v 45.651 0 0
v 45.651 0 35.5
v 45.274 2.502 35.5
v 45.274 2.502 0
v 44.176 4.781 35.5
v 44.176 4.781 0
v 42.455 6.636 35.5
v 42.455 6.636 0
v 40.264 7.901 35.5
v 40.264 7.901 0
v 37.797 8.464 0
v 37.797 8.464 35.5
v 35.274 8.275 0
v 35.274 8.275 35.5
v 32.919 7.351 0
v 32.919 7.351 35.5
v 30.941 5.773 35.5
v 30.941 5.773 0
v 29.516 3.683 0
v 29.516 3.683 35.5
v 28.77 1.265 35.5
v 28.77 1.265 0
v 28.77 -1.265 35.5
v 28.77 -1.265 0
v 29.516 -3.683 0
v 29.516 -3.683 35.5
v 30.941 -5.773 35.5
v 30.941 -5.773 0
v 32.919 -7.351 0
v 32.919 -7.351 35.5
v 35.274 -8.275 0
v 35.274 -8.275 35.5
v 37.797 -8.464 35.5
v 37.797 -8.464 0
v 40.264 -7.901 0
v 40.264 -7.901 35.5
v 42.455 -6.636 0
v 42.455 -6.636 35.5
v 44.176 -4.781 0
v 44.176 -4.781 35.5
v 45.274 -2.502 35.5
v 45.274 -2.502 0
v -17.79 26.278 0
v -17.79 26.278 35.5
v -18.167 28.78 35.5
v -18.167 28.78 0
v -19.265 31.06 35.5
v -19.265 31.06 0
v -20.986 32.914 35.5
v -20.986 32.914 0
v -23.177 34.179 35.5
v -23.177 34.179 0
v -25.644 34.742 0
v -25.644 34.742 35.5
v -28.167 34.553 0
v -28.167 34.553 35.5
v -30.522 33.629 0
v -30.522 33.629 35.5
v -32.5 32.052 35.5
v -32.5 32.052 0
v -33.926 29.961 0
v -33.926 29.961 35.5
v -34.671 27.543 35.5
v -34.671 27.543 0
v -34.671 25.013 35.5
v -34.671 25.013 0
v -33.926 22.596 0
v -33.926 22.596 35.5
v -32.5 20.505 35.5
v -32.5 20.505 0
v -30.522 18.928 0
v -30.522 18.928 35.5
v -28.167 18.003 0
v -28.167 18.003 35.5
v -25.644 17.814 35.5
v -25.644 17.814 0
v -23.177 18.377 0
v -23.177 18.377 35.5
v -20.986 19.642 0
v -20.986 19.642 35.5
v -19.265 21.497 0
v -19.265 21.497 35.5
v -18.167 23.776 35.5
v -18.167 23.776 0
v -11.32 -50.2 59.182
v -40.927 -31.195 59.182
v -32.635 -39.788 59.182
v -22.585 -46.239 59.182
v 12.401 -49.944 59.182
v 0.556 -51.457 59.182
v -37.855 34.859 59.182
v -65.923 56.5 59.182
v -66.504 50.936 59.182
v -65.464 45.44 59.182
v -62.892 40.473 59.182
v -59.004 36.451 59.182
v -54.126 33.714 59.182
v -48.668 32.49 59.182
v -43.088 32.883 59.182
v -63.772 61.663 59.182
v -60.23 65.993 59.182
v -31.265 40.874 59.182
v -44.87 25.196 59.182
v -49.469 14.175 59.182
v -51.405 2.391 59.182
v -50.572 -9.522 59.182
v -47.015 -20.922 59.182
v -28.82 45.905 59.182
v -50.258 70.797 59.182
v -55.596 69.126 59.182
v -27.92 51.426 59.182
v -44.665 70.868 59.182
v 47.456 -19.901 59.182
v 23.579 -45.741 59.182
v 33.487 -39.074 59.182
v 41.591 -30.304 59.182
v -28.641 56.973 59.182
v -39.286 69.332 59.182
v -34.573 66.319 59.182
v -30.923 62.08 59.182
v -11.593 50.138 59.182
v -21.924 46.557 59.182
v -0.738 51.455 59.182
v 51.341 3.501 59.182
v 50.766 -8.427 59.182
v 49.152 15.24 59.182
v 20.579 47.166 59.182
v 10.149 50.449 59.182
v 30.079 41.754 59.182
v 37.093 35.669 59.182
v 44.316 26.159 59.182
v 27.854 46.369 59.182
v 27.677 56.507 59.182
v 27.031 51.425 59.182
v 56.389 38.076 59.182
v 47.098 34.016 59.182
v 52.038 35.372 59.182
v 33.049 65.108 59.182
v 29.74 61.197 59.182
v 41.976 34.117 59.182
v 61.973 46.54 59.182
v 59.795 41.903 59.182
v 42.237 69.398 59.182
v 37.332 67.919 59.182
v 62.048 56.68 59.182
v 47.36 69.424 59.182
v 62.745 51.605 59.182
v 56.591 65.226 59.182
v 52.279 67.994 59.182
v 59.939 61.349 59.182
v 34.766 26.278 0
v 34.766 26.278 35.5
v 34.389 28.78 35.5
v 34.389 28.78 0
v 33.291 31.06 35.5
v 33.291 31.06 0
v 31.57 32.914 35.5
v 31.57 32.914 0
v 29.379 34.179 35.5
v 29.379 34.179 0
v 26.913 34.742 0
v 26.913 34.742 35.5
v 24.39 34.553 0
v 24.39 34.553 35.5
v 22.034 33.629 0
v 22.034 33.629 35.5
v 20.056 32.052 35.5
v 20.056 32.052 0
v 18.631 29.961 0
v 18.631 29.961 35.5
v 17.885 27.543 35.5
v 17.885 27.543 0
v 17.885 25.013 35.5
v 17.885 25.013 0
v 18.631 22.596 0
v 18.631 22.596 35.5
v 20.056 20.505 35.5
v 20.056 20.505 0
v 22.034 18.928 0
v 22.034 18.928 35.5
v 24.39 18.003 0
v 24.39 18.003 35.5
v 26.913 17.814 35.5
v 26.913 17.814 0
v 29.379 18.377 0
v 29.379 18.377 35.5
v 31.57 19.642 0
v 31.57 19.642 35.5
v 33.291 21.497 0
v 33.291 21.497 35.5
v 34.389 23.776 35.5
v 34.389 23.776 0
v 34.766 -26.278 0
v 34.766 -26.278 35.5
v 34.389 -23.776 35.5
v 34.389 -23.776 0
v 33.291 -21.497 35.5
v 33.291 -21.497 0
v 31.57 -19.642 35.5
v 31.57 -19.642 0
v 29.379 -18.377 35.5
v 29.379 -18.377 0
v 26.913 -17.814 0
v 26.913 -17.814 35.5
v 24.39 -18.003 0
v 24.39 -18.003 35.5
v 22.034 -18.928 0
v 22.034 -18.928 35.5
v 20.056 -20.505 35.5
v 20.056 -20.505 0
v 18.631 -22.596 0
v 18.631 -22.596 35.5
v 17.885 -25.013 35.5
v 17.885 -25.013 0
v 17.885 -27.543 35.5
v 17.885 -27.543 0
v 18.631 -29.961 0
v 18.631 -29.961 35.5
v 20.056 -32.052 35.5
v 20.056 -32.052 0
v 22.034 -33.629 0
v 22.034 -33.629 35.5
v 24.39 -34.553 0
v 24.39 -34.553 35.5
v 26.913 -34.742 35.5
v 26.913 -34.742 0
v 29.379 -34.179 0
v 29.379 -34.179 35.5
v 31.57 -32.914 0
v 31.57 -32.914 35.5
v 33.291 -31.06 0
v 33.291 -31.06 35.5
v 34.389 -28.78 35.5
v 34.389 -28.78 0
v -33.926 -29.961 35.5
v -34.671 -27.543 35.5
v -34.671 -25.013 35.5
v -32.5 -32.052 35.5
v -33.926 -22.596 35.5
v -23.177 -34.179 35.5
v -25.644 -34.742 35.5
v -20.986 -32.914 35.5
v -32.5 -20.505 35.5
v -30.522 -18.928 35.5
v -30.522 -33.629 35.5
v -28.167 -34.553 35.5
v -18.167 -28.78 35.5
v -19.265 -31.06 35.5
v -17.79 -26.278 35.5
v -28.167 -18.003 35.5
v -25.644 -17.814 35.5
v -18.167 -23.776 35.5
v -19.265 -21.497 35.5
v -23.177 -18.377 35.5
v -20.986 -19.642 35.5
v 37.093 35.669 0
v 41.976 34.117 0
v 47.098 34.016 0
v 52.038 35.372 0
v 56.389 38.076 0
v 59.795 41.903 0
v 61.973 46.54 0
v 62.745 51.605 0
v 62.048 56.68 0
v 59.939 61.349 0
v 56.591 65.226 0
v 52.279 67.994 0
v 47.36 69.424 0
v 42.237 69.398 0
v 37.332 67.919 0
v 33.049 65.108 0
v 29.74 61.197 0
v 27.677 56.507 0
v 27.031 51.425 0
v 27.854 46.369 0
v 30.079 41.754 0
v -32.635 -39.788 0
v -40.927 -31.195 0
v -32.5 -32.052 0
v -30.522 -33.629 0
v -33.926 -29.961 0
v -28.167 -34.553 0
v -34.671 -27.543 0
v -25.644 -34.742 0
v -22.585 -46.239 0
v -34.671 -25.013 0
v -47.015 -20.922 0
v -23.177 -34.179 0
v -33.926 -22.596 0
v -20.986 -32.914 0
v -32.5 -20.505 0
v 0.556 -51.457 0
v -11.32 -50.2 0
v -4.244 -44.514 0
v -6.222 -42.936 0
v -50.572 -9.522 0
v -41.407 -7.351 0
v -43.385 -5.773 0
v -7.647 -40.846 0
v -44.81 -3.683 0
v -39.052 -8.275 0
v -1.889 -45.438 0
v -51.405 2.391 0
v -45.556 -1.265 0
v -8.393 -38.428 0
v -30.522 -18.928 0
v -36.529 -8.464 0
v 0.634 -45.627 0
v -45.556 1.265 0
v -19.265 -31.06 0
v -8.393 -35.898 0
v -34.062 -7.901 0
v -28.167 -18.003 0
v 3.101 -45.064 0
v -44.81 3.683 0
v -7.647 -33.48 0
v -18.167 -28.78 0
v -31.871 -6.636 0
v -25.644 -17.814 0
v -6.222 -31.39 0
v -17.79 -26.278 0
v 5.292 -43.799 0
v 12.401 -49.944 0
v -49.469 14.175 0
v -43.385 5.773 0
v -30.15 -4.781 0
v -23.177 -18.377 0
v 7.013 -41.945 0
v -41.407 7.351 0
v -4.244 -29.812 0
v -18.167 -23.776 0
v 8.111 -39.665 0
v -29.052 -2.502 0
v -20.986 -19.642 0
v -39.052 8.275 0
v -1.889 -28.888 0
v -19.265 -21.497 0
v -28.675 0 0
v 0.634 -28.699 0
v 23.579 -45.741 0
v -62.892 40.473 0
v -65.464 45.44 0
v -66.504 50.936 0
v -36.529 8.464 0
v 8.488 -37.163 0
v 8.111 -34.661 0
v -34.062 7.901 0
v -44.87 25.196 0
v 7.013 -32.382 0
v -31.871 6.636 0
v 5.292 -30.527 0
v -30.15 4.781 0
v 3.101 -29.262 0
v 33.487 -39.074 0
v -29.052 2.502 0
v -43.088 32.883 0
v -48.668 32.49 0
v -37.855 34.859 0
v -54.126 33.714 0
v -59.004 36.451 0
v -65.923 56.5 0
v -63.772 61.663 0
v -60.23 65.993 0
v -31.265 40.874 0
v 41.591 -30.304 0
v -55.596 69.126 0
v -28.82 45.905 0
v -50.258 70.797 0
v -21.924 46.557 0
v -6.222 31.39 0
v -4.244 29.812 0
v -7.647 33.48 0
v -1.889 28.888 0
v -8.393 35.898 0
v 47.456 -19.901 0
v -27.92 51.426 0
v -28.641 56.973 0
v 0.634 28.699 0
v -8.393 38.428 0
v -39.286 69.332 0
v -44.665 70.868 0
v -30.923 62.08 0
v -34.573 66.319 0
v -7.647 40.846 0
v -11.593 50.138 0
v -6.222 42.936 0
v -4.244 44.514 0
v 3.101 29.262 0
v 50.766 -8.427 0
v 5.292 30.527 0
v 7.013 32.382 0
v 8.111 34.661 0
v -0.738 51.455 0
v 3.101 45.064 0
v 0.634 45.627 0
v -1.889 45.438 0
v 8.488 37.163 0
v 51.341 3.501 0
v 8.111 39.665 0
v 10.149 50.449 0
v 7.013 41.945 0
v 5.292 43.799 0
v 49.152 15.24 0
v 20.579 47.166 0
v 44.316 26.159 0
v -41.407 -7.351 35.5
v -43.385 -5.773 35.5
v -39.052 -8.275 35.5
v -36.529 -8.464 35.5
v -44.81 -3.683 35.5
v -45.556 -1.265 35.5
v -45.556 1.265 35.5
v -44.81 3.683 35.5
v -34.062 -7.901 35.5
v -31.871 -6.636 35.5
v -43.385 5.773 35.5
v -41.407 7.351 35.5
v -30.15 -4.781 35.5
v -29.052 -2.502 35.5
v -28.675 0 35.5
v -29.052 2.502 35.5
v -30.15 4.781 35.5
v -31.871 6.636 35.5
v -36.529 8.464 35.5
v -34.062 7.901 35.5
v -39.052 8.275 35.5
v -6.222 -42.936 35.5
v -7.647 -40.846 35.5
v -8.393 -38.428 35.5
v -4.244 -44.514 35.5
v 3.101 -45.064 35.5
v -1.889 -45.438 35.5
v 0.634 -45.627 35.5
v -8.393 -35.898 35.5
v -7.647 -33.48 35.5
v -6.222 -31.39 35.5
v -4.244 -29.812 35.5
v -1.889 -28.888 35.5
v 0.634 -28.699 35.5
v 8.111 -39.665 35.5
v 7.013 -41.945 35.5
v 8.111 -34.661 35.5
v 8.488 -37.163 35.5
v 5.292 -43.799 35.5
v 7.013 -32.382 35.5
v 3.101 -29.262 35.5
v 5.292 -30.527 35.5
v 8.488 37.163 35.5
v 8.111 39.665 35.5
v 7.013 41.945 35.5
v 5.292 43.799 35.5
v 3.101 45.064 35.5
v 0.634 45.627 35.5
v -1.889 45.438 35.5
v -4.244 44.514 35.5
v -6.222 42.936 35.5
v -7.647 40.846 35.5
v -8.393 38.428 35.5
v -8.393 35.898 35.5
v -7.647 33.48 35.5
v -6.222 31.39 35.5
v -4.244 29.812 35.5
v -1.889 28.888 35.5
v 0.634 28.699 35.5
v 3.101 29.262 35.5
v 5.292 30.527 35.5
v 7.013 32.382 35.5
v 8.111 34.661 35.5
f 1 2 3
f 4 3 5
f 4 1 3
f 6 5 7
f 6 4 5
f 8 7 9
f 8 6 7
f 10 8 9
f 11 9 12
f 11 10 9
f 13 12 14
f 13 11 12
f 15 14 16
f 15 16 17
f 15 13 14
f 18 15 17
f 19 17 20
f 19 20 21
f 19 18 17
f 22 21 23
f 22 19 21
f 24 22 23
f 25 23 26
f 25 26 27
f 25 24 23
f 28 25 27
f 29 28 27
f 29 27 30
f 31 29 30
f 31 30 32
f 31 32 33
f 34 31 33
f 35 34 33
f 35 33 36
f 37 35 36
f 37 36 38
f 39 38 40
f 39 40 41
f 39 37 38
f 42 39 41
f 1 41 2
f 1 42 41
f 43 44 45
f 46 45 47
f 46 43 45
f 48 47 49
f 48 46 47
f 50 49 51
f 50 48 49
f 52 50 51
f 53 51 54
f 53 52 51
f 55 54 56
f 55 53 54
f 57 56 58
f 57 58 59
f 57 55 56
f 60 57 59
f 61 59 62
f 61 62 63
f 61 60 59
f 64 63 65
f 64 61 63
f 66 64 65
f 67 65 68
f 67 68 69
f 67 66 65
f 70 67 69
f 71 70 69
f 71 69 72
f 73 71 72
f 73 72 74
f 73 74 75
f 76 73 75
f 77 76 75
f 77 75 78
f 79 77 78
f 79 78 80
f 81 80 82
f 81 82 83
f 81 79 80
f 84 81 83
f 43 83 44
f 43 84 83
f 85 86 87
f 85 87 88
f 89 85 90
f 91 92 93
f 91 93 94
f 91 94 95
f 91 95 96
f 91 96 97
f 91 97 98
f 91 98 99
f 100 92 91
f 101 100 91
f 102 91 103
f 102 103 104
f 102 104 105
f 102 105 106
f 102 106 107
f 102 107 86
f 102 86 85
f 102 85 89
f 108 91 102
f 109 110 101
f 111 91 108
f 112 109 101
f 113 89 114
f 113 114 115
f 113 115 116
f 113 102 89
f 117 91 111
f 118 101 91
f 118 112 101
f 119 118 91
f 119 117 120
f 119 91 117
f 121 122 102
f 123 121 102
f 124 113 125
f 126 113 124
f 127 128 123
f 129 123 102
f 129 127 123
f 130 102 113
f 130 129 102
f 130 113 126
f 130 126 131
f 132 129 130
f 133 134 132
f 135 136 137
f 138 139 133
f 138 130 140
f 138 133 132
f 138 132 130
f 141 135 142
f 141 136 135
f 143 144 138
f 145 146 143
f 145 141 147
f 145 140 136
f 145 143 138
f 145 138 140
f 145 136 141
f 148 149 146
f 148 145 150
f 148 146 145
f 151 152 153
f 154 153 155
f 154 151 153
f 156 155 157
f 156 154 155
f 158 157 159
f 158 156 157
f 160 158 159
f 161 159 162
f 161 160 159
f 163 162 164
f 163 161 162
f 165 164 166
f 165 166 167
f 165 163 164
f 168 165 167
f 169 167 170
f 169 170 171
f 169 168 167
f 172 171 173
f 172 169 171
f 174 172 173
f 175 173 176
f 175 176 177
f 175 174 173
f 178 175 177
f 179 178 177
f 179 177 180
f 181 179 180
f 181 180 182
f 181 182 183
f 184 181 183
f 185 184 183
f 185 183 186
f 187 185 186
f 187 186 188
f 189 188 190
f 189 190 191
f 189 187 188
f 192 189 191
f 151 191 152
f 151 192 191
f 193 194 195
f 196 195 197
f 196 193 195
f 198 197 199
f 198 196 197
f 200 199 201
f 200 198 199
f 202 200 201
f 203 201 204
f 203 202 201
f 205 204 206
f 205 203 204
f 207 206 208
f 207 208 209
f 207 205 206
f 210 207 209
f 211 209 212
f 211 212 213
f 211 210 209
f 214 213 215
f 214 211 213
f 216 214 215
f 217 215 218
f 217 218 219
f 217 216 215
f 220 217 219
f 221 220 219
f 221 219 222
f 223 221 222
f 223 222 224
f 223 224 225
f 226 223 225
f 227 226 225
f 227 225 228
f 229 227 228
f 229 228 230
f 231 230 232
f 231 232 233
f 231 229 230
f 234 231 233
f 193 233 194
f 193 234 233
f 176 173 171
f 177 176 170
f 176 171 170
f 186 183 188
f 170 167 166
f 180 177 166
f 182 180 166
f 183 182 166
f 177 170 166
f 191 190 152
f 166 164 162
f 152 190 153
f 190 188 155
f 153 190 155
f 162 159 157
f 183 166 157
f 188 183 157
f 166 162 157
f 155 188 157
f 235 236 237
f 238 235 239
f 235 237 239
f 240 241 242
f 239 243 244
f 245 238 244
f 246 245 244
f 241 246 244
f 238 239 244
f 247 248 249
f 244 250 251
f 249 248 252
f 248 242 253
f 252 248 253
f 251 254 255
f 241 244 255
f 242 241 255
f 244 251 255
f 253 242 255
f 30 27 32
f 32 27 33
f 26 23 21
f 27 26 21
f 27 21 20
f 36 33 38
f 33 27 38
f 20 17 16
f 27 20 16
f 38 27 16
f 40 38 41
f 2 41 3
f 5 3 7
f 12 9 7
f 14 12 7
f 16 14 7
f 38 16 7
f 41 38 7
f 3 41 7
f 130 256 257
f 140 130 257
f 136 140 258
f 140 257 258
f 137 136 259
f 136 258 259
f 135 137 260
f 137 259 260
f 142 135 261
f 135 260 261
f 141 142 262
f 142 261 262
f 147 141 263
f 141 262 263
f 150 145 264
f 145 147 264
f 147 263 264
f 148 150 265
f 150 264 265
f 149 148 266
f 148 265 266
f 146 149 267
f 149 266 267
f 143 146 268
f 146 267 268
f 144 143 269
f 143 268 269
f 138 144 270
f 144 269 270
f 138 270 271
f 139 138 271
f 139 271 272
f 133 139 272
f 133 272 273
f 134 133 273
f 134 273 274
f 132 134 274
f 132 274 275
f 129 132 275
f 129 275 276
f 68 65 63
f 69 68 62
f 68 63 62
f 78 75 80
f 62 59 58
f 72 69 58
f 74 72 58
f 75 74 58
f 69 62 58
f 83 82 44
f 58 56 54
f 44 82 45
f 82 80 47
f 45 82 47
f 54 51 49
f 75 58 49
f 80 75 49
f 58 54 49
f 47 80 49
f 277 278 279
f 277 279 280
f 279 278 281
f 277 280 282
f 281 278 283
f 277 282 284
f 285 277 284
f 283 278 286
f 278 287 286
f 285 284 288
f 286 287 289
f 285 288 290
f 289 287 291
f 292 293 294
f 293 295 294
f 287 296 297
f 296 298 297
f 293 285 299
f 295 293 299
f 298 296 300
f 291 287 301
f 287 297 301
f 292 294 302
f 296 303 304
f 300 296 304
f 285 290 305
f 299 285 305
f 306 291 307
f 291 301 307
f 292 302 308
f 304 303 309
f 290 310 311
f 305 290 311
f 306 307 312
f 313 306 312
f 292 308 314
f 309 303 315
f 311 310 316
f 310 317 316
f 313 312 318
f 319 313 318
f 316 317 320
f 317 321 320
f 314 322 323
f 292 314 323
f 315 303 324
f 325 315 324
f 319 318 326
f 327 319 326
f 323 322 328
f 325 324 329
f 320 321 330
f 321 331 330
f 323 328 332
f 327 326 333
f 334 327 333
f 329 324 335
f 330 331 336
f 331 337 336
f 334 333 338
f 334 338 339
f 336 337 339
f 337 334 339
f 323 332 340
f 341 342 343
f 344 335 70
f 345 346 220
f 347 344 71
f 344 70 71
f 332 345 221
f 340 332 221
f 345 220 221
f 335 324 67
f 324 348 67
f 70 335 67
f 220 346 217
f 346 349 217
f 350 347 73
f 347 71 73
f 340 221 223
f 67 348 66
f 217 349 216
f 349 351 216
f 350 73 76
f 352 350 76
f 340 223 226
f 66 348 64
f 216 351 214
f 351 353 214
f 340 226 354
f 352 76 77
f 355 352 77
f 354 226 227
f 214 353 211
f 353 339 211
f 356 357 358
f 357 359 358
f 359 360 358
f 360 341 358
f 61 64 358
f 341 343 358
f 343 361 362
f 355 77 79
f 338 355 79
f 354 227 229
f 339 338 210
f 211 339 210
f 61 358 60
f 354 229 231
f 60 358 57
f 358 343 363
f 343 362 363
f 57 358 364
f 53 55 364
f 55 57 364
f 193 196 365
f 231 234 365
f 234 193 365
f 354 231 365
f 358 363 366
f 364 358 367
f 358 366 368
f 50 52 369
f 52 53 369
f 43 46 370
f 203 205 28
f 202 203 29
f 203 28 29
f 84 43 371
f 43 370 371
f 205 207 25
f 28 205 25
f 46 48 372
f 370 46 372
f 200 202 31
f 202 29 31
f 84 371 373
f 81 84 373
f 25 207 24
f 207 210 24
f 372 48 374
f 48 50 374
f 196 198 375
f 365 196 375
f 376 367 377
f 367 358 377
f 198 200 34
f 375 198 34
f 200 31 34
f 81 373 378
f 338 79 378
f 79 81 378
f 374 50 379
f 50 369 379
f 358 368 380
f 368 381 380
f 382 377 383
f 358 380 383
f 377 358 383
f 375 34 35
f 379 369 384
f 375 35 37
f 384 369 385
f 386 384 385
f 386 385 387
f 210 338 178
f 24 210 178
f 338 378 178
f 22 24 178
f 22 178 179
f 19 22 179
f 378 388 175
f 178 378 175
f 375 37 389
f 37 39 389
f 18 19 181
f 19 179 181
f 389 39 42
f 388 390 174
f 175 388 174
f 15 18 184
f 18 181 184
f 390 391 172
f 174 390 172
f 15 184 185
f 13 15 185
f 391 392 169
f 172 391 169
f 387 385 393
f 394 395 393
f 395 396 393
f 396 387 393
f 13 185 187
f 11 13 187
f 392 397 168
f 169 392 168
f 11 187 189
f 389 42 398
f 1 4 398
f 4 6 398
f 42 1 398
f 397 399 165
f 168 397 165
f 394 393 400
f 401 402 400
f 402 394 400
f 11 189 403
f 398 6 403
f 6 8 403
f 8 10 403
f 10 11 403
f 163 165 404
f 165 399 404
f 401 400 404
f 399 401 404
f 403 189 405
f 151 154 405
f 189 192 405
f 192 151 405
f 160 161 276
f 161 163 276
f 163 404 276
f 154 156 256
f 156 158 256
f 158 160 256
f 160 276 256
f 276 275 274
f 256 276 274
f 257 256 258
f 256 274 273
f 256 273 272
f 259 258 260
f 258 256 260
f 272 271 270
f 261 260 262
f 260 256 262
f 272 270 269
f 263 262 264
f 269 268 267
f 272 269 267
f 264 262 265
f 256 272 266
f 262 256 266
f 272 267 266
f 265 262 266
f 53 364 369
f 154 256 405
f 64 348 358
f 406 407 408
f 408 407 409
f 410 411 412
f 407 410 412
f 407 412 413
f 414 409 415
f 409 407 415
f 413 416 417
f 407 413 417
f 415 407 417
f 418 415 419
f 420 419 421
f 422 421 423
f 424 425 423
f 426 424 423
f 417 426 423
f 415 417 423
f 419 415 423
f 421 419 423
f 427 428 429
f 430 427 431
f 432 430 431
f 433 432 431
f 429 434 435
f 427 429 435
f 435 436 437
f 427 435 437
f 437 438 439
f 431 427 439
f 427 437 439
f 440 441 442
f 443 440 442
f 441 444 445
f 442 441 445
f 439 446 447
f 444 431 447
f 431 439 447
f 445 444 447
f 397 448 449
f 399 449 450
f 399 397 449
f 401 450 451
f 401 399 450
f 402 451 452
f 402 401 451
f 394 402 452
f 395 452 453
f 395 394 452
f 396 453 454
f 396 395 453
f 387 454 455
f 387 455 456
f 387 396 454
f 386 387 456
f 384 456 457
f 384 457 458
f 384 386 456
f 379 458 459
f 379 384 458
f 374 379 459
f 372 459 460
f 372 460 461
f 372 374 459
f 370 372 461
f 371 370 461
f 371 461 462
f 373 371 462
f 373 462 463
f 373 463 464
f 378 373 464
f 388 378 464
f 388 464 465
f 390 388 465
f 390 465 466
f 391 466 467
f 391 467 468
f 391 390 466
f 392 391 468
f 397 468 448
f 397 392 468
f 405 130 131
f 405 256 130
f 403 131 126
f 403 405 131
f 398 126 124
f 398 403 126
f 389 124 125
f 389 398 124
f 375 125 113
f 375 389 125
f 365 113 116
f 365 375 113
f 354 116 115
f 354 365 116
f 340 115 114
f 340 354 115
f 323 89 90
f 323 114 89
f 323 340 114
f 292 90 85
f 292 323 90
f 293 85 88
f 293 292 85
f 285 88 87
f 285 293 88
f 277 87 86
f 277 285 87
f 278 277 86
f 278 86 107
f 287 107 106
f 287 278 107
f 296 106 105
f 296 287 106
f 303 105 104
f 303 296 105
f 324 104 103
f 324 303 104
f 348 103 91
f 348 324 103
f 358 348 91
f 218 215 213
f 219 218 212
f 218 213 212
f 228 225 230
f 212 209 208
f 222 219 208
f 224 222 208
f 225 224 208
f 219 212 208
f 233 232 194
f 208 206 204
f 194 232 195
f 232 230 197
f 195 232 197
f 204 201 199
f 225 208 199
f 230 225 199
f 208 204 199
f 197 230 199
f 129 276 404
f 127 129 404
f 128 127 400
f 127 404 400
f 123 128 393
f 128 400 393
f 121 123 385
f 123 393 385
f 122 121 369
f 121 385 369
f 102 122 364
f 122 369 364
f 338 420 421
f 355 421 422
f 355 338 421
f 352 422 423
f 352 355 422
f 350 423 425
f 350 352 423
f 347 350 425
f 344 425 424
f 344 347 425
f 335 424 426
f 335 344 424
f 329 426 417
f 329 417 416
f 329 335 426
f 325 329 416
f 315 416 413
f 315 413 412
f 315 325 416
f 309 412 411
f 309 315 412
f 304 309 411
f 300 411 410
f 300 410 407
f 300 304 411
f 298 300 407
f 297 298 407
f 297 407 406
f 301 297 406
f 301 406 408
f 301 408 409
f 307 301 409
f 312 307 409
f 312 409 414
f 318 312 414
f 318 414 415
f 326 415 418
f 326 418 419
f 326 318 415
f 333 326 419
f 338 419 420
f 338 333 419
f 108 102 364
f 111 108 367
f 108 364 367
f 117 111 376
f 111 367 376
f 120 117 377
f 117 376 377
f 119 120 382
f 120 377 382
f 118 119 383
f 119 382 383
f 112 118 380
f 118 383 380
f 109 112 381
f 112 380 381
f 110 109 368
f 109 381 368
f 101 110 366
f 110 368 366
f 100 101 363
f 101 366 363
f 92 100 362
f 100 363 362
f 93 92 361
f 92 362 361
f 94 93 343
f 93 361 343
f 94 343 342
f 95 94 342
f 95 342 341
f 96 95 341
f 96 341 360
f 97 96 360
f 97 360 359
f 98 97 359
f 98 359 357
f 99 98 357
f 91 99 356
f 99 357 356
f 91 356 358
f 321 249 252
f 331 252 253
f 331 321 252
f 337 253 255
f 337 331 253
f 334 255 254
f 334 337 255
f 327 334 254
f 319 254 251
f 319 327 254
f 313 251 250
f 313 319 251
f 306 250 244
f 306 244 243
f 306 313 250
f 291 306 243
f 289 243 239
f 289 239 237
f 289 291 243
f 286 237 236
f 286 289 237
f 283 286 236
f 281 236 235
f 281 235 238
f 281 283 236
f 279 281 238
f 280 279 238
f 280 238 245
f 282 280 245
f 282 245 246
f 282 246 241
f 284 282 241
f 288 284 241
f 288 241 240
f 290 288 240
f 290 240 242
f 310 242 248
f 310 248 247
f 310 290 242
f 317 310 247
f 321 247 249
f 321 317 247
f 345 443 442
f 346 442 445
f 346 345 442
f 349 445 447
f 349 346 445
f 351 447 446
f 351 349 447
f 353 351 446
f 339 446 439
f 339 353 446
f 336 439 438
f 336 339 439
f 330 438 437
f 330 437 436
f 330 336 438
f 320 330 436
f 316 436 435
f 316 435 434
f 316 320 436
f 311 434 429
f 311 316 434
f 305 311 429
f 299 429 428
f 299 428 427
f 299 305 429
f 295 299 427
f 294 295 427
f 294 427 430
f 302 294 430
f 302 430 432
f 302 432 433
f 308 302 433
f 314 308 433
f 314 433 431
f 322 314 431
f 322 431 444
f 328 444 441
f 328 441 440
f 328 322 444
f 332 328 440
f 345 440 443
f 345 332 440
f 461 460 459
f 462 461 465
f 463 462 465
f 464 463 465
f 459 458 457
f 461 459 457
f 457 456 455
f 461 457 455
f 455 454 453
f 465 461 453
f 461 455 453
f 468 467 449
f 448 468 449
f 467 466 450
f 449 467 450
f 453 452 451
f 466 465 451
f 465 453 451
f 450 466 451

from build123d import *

# Parameters (mm, degrees)
F0_R       = 51.4602695285
F1_DEPTH   = 25.4
F2_DEPTH   = 28.956
F3_R       = 17.858664642
F3_R_2     = 19.3013042732
F1_FACE1_R = 51.4602695285
F4_DEPTH   = 59.182
F5_R       = 8.4878937559
F6_DEPTH   = 35.5


with BuildPart() as f1:
    # F0 (on Top) → F1 (new body)
    with BuildSketch(Plane.XY):
        Circle(F0_R)
    extrude(amount=F1_DEPTH)

    # F2 (add): a face of the model
    f2_faces = [f1.faces().sort_by_distance(p)[0] for p in [
        (0, 0, 25.4),
    ]]
    extrude(f2_faces, amount=F2_DEPTH)

    # F3 (on Top) + F1_face1 (on face) → F4 (join)
    with BuildSketch(Plane.XY):
        with Locations((44.8872148991, 51.7368838191)):
            Circle(F3_R)
        with Locations((-47.2190156579, 51.7368838191)):
            Circle(F3_R_2)
    with BuildSketch(Plane(origin=(0, 0, 0), x_dir=(1, 0, 0), z_dir=(0, 0, -1))):
        Circle(F1_FACE1_R)
    extrude(amount=F4_DEPTH, dir=(0, 0, 1))

    # F5 (on Top) → F6 (cut)
    with BuildSketch(Plane.XY):
        with Locations((-37.1631160378, 0)):
            Circle(F5_R)
        with Locations((-26.2782913604, 26.2782913604)):
            Circle(F5_R)
        with Locations((0, 37.1631160378)):
            Circle(F5_R)
        with Locations((26.2782913604, 26.2782913604)):
            Circle(F5_R)
        with Locations((37.1631160378, 0)):
            Circle(F5_R)
        with Locations((26.2782913604, -26.2782913604)):
            Circle(F5_R)
        with Locations((0, -37.1631160378)):
            Circle(F5_R)
        with Locations((-26.2782913604, -26.2782913604)):
            Circle(F5_R)
    extrude(amount=F6_DEPTH, mode=Mode.SUBTRACT)


solid = f1.part
